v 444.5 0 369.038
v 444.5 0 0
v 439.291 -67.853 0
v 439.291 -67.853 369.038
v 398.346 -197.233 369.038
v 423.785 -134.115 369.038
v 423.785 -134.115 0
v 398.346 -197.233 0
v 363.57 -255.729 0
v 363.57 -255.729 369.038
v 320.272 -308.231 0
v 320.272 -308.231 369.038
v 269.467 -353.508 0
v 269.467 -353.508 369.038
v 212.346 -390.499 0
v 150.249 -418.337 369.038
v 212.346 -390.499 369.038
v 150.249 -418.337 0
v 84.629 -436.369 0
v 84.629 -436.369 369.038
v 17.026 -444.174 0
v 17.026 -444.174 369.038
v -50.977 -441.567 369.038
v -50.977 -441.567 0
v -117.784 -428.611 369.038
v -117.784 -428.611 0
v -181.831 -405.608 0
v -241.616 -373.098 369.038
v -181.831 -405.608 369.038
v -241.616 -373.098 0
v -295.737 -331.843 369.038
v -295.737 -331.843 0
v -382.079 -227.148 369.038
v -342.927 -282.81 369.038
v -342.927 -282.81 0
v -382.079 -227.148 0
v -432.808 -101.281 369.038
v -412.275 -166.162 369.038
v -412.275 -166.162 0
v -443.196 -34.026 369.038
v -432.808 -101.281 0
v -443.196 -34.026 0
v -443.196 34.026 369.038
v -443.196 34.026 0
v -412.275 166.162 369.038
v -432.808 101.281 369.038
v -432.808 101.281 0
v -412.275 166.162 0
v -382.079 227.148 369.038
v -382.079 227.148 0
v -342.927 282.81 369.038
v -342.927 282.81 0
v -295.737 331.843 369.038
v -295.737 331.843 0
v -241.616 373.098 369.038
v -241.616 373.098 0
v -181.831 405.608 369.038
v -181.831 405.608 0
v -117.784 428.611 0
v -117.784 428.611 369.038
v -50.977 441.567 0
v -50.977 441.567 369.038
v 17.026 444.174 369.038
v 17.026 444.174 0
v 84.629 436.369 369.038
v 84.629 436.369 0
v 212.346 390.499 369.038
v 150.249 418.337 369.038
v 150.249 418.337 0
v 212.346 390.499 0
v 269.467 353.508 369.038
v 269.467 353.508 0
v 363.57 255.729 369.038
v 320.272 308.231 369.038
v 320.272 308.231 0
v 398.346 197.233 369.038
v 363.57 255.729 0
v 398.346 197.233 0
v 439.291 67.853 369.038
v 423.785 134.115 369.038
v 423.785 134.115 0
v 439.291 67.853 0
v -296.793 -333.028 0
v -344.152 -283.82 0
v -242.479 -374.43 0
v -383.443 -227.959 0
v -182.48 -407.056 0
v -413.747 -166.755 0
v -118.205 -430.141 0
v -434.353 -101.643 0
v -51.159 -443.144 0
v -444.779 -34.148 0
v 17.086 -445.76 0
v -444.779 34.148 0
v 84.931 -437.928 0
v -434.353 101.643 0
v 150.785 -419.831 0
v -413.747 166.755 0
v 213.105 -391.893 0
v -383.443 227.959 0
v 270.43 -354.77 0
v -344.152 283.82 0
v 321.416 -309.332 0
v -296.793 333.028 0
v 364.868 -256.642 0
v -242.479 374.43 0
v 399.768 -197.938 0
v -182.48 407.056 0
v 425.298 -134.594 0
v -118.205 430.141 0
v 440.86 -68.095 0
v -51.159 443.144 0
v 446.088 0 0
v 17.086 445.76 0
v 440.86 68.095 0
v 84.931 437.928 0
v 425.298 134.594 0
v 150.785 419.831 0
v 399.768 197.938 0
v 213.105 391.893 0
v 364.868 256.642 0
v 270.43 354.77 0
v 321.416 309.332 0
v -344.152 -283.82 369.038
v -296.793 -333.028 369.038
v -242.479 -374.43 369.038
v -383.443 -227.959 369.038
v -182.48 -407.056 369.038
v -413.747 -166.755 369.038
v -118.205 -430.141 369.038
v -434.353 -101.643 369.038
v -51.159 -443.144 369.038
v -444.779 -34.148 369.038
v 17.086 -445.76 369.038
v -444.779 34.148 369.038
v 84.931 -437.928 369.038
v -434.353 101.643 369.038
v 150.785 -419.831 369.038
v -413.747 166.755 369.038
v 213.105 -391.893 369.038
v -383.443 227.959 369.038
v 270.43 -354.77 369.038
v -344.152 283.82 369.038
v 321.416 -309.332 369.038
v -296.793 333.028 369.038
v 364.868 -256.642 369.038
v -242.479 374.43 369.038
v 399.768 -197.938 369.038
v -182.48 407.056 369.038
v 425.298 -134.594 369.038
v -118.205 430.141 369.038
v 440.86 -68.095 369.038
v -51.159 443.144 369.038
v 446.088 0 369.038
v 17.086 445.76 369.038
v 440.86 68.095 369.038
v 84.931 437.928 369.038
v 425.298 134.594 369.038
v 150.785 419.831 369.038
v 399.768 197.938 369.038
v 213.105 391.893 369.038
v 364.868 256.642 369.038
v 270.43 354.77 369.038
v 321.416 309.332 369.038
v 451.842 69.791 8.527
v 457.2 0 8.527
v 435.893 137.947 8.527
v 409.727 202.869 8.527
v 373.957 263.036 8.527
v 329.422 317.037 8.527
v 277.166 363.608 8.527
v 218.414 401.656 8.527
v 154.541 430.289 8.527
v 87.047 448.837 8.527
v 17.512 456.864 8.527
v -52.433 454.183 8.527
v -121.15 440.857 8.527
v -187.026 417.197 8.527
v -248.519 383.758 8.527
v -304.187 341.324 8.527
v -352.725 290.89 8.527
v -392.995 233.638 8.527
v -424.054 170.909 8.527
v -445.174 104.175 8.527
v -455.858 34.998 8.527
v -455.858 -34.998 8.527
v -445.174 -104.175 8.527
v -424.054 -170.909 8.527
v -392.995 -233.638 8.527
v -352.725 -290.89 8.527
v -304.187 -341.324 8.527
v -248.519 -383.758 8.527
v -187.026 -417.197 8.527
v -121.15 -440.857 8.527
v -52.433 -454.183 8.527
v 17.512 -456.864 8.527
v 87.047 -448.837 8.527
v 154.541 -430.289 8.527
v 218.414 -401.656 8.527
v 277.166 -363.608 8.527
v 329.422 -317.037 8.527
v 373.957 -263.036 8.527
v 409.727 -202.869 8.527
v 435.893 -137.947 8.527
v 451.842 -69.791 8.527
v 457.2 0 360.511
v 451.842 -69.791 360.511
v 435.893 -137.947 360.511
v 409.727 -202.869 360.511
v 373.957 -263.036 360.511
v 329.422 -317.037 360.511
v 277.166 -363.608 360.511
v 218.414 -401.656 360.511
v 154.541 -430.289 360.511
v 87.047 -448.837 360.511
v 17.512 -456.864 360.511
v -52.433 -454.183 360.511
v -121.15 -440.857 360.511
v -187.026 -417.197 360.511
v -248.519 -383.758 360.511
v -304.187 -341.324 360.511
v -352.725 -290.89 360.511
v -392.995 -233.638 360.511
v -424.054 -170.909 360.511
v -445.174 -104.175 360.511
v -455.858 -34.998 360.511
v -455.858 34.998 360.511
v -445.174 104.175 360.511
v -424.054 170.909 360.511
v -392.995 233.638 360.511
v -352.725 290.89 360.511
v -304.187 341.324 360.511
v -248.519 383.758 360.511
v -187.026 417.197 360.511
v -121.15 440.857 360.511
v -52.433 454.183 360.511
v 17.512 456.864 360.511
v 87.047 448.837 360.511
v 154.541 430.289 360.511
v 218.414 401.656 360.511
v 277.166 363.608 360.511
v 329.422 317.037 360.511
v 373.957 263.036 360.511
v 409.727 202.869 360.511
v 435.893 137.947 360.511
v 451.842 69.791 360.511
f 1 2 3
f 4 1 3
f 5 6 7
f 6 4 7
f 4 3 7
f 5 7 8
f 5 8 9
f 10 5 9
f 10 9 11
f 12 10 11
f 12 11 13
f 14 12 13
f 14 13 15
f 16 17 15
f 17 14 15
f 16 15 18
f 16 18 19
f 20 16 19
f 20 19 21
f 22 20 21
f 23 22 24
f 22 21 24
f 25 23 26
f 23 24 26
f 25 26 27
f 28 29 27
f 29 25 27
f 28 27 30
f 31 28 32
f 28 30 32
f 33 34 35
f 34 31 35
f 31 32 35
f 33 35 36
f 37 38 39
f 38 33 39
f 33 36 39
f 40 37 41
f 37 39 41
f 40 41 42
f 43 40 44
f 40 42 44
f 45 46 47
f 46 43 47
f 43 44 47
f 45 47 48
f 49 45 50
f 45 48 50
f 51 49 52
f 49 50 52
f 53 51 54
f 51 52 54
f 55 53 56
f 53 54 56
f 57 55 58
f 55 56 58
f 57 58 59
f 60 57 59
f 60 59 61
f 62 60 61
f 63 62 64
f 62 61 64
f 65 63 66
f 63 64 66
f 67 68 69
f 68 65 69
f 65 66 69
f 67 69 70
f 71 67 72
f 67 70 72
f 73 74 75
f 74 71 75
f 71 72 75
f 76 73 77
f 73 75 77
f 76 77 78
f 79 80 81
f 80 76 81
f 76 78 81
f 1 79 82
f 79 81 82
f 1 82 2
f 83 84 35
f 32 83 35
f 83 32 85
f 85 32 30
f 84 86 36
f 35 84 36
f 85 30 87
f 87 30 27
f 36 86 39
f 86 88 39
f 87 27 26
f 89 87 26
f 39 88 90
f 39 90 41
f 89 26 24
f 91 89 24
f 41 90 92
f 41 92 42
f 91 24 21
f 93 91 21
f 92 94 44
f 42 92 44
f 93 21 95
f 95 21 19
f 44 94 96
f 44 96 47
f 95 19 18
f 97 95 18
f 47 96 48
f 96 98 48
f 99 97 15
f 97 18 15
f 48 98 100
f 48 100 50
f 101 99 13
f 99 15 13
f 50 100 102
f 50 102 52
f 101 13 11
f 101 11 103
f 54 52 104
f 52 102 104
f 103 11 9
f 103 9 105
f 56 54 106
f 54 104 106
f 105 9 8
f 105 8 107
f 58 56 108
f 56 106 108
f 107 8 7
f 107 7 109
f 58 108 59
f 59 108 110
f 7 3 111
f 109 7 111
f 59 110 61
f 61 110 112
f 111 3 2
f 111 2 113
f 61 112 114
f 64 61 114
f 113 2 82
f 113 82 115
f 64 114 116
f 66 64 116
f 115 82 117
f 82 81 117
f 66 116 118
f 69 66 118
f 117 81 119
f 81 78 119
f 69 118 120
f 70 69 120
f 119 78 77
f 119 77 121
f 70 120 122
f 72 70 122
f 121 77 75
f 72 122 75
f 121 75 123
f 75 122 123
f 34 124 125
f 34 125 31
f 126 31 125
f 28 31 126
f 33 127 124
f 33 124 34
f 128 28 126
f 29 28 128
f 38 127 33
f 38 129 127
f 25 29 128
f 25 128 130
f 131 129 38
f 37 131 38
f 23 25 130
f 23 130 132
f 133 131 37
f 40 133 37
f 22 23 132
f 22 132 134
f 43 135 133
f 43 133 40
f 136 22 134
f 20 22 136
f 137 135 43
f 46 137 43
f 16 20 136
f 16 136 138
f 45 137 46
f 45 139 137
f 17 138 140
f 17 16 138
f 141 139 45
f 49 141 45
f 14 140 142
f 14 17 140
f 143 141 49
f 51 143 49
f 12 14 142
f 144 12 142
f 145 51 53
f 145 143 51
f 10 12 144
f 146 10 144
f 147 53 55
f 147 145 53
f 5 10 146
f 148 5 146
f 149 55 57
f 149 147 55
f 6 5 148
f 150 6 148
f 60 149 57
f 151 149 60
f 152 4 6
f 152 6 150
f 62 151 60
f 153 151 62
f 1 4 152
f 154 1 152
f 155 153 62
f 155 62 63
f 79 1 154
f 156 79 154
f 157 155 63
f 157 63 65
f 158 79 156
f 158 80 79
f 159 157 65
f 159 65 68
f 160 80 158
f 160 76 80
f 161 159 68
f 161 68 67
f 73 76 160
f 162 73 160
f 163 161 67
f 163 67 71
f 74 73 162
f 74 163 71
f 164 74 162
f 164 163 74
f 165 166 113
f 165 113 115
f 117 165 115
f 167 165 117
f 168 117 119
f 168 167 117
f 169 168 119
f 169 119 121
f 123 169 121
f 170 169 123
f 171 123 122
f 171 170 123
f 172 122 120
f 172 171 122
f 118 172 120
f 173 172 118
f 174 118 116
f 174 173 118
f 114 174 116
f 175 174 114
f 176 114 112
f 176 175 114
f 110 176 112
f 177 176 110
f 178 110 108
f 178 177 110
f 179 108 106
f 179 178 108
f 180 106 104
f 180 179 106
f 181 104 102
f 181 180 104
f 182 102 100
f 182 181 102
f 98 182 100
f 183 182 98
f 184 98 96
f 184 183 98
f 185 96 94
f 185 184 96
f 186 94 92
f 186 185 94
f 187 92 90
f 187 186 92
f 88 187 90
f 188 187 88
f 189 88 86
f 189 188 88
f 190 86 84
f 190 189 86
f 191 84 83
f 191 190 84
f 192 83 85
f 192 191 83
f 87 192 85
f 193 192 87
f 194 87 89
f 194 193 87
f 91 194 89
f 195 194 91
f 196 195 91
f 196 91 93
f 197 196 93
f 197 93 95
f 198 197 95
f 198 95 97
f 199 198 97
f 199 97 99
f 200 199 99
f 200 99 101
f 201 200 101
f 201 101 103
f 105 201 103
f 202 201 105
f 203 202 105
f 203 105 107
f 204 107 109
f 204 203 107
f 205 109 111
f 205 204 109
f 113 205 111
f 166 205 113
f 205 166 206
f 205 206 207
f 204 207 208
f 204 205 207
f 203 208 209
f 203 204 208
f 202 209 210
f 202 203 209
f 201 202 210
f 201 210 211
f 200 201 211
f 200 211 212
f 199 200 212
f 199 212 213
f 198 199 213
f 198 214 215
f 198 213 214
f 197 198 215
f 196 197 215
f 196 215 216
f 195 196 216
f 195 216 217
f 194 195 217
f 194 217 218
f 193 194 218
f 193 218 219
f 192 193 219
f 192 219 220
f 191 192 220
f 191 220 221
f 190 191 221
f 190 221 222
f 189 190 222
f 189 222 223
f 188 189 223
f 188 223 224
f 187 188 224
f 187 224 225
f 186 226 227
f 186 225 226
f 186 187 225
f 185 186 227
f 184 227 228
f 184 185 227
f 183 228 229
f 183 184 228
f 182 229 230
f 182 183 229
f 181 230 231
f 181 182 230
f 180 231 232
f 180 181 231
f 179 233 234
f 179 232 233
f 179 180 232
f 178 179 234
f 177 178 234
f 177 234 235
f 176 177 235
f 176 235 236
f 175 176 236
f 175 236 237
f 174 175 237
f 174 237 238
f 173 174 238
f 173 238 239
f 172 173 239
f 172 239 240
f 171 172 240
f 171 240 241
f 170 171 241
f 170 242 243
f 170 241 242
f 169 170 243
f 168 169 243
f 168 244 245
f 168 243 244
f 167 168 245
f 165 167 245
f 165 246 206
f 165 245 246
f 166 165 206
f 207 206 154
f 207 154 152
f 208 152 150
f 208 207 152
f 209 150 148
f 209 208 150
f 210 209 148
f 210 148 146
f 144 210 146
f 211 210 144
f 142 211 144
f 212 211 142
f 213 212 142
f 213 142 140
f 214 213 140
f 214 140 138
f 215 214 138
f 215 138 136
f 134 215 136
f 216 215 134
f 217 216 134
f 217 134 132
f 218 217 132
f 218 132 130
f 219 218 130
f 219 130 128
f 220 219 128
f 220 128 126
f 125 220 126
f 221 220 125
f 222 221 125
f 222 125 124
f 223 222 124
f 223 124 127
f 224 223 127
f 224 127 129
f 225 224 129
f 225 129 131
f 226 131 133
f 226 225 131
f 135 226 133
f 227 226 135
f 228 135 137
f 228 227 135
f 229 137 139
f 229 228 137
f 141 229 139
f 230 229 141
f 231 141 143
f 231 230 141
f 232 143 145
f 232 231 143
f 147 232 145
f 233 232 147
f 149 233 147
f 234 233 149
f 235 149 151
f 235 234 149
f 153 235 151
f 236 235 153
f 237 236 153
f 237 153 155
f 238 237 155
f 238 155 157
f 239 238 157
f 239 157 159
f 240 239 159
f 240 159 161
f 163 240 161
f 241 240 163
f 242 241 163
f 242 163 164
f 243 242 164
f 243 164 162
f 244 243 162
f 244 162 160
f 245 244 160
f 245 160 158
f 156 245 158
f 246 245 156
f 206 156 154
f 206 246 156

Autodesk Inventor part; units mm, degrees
ref_plane "YZ Plane" through (0, 0, 0) normal (1, 0, 0) x (0, 1, 0)
ref_plane "XZ Plane" through (0, 0, 0) normal (0, 1, 0) x (-1, 0, 0)
ref_plane "XY Plane" through (0, 0, 0) normal (0, 0, 1) x (1, 0, 0)
sketch "Sketch1" plane through (0, 0, 0) normal (0, 0, 1) x (1, 0, 0)
  circle A0 centre (0, 0) radius 457.2
  circle A1 centre (0, 0) radius 444.5
  dimension "d0" = 914.4
  dimension "d1" = 889
extrude "Extrusion1" add sketch "Sketch1" along normal blind 369.0375
chamfer "Chamfer1" distance 11.1125 angle 37.5 1 edges at (-457.2, 0, 0) measured on face at (-448.3191, -14.9353, 0)
chamfer "Chamfer2" distance 11.1125 angle 37.5 1 edges at (-457.2, 0, 369.0375) measured on face at (-448.3191, -14.9353, 369.0375)
equation "\"d7\" = d4"
equation "\"d9\" = d6"
equation "\"d4\" = 11.1125"
equation "\"d6\" = 37.5deg"
properties part number "A1-19027-100-02 36in pipe" material "Steel, Mild"
